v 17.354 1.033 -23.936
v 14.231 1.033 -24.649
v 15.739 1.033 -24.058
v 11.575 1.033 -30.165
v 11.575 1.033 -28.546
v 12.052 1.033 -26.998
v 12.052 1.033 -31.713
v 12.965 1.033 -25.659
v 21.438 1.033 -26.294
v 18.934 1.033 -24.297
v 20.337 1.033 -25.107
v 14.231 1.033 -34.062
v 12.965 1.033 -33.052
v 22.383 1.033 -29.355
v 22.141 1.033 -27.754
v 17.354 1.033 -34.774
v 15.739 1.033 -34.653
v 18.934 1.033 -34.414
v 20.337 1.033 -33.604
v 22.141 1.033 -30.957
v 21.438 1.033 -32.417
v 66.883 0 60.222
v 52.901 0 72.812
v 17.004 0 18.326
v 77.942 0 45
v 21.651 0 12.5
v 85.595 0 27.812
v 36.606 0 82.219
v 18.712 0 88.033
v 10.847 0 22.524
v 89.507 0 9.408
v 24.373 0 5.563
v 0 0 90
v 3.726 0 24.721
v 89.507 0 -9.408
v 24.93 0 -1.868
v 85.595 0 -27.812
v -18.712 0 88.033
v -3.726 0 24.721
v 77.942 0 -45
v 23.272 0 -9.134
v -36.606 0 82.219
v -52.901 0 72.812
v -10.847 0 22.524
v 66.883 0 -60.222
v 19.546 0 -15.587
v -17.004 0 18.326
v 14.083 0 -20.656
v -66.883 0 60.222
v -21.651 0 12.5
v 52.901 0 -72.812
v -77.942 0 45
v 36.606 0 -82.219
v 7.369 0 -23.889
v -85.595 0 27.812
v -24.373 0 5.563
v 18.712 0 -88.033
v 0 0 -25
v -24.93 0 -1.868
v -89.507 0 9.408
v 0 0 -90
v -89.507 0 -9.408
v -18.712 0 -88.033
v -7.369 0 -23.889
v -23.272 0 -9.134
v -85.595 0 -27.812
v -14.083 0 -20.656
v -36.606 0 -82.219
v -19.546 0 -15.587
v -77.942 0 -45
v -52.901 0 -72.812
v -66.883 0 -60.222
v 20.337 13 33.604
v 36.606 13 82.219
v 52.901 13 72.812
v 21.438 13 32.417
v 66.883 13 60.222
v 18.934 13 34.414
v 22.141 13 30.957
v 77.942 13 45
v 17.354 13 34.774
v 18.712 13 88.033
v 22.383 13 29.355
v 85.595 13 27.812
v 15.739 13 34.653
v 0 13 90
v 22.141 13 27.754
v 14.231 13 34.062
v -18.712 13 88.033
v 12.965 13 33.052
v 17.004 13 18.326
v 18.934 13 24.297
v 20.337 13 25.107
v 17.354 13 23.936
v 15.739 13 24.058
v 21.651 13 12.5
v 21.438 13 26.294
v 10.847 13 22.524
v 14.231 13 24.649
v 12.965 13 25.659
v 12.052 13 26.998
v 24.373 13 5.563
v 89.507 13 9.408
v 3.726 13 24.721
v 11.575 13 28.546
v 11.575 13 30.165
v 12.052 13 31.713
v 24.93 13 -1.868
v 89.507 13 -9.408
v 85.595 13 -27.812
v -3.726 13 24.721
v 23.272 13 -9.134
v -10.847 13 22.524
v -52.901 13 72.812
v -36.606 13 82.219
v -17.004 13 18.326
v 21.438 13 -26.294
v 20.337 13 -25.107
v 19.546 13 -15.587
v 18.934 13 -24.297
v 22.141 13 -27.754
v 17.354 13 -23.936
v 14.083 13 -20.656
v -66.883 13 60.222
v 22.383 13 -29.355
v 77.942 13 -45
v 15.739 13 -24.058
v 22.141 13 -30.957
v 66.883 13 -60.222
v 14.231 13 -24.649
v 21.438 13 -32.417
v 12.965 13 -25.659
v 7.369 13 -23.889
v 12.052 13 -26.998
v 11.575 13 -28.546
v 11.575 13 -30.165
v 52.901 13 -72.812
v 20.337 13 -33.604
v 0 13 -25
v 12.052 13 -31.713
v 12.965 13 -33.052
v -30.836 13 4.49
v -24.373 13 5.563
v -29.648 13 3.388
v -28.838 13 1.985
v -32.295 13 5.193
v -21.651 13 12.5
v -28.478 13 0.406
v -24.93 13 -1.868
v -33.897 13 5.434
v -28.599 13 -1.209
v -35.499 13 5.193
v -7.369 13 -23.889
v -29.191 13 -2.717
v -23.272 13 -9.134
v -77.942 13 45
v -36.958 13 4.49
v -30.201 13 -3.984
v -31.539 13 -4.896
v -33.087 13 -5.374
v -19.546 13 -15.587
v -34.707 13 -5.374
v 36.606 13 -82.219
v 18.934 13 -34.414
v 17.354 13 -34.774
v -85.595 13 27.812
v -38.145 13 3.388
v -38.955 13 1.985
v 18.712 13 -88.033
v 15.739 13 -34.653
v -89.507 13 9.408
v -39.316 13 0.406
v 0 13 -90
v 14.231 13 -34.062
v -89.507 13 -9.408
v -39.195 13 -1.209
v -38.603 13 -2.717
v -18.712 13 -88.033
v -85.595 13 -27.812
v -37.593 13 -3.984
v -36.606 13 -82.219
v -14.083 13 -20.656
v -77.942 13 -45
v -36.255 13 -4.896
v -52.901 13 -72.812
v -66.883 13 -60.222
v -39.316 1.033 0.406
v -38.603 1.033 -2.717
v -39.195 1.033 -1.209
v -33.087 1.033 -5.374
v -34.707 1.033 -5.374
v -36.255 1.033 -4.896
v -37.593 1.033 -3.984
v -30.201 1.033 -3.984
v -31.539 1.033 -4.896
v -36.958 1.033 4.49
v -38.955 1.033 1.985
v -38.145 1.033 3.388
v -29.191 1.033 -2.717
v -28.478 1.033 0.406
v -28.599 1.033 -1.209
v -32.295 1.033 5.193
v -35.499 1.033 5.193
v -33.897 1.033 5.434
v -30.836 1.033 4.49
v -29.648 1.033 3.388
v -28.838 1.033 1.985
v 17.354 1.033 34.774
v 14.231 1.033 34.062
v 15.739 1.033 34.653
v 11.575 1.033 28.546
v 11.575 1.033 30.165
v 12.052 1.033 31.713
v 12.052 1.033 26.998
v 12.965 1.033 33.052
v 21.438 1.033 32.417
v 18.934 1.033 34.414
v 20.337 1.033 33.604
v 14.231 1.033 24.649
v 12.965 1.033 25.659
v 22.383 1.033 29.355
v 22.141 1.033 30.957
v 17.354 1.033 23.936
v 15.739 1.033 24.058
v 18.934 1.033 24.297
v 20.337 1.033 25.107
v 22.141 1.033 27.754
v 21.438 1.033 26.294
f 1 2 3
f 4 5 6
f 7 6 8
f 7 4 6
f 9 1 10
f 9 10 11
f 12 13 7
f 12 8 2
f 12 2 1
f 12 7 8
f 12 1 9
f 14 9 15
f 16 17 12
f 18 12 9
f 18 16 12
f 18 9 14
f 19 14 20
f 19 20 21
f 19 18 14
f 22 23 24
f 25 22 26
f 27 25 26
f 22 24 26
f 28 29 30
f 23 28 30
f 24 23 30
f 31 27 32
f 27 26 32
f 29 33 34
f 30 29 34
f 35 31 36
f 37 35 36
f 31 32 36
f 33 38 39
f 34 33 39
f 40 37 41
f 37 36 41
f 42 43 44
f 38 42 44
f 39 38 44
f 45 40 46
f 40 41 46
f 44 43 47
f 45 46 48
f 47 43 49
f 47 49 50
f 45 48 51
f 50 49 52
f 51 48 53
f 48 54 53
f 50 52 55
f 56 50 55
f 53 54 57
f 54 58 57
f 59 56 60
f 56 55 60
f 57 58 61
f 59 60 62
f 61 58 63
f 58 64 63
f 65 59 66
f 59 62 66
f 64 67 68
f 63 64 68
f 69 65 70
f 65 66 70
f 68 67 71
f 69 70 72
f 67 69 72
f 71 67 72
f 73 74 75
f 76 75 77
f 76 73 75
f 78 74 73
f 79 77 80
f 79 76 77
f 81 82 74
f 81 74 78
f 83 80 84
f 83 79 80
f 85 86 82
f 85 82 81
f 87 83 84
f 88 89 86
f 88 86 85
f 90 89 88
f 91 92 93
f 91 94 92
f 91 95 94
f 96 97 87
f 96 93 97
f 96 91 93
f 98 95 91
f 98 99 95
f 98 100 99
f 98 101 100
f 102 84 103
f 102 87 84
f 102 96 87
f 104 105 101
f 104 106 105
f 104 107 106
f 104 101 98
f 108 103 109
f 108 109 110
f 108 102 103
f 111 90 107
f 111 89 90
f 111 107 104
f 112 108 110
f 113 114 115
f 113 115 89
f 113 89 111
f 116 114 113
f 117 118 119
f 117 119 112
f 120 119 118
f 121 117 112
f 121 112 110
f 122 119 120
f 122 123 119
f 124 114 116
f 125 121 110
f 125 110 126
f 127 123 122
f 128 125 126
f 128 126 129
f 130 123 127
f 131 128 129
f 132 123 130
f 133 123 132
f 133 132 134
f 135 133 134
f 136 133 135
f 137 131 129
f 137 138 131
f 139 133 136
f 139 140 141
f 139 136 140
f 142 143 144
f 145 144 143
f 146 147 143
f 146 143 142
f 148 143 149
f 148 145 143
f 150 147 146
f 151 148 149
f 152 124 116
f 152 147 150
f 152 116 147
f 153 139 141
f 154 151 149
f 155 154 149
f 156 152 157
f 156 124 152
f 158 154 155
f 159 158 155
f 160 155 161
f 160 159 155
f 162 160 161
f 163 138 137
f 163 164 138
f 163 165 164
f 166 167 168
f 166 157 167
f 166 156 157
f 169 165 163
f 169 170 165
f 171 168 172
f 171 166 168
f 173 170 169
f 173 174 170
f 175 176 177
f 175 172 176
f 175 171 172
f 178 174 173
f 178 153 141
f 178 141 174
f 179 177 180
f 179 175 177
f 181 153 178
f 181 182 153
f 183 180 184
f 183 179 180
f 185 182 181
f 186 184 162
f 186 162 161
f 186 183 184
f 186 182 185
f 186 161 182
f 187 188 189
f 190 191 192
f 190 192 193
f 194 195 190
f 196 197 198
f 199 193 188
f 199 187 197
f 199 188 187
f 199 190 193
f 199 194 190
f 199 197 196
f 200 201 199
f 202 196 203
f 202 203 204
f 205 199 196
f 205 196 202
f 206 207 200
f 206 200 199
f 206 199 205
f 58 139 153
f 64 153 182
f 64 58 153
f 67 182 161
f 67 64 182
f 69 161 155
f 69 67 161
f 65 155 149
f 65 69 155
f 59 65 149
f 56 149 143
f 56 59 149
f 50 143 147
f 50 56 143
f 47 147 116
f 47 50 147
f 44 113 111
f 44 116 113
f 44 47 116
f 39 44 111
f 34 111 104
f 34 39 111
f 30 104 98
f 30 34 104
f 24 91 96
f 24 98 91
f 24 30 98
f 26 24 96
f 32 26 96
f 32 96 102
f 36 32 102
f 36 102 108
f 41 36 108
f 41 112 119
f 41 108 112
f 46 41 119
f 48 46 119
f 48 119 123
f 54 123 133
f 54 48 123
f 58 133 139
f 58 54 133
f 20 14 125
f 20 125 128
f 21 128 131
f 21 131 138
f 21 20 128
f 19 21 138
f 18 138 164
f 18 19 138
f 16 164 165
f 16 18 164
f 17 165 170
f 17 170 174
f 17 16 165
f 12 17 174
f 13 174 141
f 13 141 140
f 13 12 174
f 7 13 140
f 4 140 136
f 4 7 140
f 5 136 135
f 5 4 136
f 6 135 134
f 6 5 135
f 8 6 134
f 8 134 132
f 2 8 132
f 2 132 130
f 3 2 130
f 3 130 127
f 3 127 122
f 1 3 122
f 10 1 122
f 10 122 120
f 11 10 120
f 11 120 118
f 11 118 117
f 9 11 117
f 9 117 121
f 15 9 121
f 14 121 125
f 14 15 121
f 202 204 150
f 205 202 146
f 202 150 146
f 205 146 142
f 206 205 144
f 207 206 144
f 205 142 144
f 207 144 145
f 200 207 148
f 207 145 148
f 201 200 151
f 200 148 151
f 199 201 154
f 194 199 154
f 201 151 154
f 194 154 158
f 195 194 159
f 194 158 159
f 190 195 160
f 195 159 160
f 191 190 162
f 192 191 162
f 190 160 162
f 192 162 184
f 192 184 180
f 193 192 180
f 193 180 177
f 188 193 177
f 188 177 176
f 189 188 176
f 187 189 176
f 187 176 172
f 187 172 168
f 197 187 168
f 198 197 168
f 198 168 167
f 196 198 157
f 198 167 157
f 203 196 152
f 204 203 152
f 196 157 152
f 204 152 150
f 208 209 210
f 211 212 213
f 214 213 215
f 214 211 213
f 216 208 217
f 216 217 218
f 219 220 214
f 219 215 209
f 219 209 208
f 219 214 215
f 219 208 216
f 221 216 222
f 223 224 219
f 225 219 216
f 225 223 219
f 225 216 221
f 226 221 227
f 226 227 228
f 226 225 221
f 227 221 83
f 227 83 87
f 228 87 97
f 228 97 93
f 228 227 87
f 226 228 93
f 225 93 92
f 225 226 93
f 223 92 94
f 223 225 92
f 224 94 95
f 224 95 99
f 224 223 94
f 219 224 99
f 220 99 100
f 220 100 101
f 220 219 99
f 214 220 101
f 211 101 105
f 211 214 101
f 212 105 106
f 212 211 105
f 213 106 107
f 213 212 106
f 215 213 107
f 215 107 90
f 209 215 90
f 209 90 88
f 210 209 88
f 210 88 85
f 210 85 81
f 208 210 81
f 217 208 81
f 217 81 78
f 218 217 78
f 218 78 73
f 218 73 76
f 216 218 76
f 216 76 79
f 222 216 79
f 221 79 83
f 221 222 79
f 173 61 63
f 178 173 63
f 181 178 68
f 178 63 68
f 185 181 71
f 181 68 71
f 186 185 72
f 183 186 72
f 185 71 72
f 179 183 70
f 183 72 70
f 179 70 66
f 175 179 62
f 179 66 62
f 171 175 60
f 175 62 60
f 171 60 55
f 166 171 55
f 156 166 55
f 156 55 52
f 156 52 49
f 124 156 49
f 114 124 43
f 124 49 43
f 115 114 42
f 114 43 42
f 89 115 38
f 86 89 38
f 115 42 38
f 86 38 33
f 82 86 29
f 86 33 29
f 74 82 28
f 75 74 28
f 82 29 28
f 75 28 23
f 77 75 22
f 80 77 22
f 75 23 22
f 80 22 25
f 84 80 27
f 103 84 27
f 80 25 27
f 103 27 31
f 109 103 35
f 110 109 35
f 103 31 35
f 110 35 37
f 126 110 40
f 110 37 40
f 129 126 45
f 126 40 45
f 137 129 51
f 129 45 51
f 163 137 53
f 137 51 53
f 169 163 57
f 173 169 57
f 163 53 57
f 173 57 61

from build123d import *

# Parameters (mm, degrees)
SKETCH1_R           = 90
BOSS_EXTRUDE1_DEPTH = 13
SKETCH2_R           = 25
CUT_EXTRUDE1_DEPTH  = 128.941392833
SKETCH3_R           = 5.434212322
CUT_EXTRUDE2_DEPTH  = 11.967453468
CIRPATTERN1_COUNT   = 3


with BuildPart() as part:
    # Sketch1 → Boss-Extrude1 (new body)
    with BuildSketch(Plane(origin=(0, 0, 0), x_dir=(1, 0, 0), z_dir=(0, 1, 0))):
        Circle(SKETCH1_R)
    extrude(amount=BOSS_EXTRUDE1_DEPTH)

    # Sketch2 → Cut-Extrude1 (cut, through all)
    with BuildSketch(Plane(origin=(0, 0, 0), x_dir=(1, 0, 0), z_dir=(0, 1, 0))):
        Circle(SKETCH2_R)
    extrude(amount=CUT_EXTRUDE1_DEPTH, mode=Mode.SUBTRACT)

    # Sketch3 → Cut-Extrude2 (cut)
    with BuildSketch(Plane(origin=(0, 13, 0), x_dir=(1, 0, 0), z_dir=(0, 1, 0))):
        with Locations((-33.896773813, 0)):
            Circle(SKETCH3_R)
    cut_extrude2 = extrude(amount=-CUT_EXTRUDE2_DEPTH, mode=Mode.SUBTRACT)

    # CirPattern1: Cut-Extrude2 ×3 about axis
    cirpattern1_axis = Axis((0, 0, 0), (0, 1, 0))
    for i in range(1, CIRPATTERN1_COUNT):
        add(cut_extrude2.rotate(cirpattern1_axis, i * 360 / CIRPATTERN1_COUNT), mode=Mode.SUBTRACT)


solid = part.part
